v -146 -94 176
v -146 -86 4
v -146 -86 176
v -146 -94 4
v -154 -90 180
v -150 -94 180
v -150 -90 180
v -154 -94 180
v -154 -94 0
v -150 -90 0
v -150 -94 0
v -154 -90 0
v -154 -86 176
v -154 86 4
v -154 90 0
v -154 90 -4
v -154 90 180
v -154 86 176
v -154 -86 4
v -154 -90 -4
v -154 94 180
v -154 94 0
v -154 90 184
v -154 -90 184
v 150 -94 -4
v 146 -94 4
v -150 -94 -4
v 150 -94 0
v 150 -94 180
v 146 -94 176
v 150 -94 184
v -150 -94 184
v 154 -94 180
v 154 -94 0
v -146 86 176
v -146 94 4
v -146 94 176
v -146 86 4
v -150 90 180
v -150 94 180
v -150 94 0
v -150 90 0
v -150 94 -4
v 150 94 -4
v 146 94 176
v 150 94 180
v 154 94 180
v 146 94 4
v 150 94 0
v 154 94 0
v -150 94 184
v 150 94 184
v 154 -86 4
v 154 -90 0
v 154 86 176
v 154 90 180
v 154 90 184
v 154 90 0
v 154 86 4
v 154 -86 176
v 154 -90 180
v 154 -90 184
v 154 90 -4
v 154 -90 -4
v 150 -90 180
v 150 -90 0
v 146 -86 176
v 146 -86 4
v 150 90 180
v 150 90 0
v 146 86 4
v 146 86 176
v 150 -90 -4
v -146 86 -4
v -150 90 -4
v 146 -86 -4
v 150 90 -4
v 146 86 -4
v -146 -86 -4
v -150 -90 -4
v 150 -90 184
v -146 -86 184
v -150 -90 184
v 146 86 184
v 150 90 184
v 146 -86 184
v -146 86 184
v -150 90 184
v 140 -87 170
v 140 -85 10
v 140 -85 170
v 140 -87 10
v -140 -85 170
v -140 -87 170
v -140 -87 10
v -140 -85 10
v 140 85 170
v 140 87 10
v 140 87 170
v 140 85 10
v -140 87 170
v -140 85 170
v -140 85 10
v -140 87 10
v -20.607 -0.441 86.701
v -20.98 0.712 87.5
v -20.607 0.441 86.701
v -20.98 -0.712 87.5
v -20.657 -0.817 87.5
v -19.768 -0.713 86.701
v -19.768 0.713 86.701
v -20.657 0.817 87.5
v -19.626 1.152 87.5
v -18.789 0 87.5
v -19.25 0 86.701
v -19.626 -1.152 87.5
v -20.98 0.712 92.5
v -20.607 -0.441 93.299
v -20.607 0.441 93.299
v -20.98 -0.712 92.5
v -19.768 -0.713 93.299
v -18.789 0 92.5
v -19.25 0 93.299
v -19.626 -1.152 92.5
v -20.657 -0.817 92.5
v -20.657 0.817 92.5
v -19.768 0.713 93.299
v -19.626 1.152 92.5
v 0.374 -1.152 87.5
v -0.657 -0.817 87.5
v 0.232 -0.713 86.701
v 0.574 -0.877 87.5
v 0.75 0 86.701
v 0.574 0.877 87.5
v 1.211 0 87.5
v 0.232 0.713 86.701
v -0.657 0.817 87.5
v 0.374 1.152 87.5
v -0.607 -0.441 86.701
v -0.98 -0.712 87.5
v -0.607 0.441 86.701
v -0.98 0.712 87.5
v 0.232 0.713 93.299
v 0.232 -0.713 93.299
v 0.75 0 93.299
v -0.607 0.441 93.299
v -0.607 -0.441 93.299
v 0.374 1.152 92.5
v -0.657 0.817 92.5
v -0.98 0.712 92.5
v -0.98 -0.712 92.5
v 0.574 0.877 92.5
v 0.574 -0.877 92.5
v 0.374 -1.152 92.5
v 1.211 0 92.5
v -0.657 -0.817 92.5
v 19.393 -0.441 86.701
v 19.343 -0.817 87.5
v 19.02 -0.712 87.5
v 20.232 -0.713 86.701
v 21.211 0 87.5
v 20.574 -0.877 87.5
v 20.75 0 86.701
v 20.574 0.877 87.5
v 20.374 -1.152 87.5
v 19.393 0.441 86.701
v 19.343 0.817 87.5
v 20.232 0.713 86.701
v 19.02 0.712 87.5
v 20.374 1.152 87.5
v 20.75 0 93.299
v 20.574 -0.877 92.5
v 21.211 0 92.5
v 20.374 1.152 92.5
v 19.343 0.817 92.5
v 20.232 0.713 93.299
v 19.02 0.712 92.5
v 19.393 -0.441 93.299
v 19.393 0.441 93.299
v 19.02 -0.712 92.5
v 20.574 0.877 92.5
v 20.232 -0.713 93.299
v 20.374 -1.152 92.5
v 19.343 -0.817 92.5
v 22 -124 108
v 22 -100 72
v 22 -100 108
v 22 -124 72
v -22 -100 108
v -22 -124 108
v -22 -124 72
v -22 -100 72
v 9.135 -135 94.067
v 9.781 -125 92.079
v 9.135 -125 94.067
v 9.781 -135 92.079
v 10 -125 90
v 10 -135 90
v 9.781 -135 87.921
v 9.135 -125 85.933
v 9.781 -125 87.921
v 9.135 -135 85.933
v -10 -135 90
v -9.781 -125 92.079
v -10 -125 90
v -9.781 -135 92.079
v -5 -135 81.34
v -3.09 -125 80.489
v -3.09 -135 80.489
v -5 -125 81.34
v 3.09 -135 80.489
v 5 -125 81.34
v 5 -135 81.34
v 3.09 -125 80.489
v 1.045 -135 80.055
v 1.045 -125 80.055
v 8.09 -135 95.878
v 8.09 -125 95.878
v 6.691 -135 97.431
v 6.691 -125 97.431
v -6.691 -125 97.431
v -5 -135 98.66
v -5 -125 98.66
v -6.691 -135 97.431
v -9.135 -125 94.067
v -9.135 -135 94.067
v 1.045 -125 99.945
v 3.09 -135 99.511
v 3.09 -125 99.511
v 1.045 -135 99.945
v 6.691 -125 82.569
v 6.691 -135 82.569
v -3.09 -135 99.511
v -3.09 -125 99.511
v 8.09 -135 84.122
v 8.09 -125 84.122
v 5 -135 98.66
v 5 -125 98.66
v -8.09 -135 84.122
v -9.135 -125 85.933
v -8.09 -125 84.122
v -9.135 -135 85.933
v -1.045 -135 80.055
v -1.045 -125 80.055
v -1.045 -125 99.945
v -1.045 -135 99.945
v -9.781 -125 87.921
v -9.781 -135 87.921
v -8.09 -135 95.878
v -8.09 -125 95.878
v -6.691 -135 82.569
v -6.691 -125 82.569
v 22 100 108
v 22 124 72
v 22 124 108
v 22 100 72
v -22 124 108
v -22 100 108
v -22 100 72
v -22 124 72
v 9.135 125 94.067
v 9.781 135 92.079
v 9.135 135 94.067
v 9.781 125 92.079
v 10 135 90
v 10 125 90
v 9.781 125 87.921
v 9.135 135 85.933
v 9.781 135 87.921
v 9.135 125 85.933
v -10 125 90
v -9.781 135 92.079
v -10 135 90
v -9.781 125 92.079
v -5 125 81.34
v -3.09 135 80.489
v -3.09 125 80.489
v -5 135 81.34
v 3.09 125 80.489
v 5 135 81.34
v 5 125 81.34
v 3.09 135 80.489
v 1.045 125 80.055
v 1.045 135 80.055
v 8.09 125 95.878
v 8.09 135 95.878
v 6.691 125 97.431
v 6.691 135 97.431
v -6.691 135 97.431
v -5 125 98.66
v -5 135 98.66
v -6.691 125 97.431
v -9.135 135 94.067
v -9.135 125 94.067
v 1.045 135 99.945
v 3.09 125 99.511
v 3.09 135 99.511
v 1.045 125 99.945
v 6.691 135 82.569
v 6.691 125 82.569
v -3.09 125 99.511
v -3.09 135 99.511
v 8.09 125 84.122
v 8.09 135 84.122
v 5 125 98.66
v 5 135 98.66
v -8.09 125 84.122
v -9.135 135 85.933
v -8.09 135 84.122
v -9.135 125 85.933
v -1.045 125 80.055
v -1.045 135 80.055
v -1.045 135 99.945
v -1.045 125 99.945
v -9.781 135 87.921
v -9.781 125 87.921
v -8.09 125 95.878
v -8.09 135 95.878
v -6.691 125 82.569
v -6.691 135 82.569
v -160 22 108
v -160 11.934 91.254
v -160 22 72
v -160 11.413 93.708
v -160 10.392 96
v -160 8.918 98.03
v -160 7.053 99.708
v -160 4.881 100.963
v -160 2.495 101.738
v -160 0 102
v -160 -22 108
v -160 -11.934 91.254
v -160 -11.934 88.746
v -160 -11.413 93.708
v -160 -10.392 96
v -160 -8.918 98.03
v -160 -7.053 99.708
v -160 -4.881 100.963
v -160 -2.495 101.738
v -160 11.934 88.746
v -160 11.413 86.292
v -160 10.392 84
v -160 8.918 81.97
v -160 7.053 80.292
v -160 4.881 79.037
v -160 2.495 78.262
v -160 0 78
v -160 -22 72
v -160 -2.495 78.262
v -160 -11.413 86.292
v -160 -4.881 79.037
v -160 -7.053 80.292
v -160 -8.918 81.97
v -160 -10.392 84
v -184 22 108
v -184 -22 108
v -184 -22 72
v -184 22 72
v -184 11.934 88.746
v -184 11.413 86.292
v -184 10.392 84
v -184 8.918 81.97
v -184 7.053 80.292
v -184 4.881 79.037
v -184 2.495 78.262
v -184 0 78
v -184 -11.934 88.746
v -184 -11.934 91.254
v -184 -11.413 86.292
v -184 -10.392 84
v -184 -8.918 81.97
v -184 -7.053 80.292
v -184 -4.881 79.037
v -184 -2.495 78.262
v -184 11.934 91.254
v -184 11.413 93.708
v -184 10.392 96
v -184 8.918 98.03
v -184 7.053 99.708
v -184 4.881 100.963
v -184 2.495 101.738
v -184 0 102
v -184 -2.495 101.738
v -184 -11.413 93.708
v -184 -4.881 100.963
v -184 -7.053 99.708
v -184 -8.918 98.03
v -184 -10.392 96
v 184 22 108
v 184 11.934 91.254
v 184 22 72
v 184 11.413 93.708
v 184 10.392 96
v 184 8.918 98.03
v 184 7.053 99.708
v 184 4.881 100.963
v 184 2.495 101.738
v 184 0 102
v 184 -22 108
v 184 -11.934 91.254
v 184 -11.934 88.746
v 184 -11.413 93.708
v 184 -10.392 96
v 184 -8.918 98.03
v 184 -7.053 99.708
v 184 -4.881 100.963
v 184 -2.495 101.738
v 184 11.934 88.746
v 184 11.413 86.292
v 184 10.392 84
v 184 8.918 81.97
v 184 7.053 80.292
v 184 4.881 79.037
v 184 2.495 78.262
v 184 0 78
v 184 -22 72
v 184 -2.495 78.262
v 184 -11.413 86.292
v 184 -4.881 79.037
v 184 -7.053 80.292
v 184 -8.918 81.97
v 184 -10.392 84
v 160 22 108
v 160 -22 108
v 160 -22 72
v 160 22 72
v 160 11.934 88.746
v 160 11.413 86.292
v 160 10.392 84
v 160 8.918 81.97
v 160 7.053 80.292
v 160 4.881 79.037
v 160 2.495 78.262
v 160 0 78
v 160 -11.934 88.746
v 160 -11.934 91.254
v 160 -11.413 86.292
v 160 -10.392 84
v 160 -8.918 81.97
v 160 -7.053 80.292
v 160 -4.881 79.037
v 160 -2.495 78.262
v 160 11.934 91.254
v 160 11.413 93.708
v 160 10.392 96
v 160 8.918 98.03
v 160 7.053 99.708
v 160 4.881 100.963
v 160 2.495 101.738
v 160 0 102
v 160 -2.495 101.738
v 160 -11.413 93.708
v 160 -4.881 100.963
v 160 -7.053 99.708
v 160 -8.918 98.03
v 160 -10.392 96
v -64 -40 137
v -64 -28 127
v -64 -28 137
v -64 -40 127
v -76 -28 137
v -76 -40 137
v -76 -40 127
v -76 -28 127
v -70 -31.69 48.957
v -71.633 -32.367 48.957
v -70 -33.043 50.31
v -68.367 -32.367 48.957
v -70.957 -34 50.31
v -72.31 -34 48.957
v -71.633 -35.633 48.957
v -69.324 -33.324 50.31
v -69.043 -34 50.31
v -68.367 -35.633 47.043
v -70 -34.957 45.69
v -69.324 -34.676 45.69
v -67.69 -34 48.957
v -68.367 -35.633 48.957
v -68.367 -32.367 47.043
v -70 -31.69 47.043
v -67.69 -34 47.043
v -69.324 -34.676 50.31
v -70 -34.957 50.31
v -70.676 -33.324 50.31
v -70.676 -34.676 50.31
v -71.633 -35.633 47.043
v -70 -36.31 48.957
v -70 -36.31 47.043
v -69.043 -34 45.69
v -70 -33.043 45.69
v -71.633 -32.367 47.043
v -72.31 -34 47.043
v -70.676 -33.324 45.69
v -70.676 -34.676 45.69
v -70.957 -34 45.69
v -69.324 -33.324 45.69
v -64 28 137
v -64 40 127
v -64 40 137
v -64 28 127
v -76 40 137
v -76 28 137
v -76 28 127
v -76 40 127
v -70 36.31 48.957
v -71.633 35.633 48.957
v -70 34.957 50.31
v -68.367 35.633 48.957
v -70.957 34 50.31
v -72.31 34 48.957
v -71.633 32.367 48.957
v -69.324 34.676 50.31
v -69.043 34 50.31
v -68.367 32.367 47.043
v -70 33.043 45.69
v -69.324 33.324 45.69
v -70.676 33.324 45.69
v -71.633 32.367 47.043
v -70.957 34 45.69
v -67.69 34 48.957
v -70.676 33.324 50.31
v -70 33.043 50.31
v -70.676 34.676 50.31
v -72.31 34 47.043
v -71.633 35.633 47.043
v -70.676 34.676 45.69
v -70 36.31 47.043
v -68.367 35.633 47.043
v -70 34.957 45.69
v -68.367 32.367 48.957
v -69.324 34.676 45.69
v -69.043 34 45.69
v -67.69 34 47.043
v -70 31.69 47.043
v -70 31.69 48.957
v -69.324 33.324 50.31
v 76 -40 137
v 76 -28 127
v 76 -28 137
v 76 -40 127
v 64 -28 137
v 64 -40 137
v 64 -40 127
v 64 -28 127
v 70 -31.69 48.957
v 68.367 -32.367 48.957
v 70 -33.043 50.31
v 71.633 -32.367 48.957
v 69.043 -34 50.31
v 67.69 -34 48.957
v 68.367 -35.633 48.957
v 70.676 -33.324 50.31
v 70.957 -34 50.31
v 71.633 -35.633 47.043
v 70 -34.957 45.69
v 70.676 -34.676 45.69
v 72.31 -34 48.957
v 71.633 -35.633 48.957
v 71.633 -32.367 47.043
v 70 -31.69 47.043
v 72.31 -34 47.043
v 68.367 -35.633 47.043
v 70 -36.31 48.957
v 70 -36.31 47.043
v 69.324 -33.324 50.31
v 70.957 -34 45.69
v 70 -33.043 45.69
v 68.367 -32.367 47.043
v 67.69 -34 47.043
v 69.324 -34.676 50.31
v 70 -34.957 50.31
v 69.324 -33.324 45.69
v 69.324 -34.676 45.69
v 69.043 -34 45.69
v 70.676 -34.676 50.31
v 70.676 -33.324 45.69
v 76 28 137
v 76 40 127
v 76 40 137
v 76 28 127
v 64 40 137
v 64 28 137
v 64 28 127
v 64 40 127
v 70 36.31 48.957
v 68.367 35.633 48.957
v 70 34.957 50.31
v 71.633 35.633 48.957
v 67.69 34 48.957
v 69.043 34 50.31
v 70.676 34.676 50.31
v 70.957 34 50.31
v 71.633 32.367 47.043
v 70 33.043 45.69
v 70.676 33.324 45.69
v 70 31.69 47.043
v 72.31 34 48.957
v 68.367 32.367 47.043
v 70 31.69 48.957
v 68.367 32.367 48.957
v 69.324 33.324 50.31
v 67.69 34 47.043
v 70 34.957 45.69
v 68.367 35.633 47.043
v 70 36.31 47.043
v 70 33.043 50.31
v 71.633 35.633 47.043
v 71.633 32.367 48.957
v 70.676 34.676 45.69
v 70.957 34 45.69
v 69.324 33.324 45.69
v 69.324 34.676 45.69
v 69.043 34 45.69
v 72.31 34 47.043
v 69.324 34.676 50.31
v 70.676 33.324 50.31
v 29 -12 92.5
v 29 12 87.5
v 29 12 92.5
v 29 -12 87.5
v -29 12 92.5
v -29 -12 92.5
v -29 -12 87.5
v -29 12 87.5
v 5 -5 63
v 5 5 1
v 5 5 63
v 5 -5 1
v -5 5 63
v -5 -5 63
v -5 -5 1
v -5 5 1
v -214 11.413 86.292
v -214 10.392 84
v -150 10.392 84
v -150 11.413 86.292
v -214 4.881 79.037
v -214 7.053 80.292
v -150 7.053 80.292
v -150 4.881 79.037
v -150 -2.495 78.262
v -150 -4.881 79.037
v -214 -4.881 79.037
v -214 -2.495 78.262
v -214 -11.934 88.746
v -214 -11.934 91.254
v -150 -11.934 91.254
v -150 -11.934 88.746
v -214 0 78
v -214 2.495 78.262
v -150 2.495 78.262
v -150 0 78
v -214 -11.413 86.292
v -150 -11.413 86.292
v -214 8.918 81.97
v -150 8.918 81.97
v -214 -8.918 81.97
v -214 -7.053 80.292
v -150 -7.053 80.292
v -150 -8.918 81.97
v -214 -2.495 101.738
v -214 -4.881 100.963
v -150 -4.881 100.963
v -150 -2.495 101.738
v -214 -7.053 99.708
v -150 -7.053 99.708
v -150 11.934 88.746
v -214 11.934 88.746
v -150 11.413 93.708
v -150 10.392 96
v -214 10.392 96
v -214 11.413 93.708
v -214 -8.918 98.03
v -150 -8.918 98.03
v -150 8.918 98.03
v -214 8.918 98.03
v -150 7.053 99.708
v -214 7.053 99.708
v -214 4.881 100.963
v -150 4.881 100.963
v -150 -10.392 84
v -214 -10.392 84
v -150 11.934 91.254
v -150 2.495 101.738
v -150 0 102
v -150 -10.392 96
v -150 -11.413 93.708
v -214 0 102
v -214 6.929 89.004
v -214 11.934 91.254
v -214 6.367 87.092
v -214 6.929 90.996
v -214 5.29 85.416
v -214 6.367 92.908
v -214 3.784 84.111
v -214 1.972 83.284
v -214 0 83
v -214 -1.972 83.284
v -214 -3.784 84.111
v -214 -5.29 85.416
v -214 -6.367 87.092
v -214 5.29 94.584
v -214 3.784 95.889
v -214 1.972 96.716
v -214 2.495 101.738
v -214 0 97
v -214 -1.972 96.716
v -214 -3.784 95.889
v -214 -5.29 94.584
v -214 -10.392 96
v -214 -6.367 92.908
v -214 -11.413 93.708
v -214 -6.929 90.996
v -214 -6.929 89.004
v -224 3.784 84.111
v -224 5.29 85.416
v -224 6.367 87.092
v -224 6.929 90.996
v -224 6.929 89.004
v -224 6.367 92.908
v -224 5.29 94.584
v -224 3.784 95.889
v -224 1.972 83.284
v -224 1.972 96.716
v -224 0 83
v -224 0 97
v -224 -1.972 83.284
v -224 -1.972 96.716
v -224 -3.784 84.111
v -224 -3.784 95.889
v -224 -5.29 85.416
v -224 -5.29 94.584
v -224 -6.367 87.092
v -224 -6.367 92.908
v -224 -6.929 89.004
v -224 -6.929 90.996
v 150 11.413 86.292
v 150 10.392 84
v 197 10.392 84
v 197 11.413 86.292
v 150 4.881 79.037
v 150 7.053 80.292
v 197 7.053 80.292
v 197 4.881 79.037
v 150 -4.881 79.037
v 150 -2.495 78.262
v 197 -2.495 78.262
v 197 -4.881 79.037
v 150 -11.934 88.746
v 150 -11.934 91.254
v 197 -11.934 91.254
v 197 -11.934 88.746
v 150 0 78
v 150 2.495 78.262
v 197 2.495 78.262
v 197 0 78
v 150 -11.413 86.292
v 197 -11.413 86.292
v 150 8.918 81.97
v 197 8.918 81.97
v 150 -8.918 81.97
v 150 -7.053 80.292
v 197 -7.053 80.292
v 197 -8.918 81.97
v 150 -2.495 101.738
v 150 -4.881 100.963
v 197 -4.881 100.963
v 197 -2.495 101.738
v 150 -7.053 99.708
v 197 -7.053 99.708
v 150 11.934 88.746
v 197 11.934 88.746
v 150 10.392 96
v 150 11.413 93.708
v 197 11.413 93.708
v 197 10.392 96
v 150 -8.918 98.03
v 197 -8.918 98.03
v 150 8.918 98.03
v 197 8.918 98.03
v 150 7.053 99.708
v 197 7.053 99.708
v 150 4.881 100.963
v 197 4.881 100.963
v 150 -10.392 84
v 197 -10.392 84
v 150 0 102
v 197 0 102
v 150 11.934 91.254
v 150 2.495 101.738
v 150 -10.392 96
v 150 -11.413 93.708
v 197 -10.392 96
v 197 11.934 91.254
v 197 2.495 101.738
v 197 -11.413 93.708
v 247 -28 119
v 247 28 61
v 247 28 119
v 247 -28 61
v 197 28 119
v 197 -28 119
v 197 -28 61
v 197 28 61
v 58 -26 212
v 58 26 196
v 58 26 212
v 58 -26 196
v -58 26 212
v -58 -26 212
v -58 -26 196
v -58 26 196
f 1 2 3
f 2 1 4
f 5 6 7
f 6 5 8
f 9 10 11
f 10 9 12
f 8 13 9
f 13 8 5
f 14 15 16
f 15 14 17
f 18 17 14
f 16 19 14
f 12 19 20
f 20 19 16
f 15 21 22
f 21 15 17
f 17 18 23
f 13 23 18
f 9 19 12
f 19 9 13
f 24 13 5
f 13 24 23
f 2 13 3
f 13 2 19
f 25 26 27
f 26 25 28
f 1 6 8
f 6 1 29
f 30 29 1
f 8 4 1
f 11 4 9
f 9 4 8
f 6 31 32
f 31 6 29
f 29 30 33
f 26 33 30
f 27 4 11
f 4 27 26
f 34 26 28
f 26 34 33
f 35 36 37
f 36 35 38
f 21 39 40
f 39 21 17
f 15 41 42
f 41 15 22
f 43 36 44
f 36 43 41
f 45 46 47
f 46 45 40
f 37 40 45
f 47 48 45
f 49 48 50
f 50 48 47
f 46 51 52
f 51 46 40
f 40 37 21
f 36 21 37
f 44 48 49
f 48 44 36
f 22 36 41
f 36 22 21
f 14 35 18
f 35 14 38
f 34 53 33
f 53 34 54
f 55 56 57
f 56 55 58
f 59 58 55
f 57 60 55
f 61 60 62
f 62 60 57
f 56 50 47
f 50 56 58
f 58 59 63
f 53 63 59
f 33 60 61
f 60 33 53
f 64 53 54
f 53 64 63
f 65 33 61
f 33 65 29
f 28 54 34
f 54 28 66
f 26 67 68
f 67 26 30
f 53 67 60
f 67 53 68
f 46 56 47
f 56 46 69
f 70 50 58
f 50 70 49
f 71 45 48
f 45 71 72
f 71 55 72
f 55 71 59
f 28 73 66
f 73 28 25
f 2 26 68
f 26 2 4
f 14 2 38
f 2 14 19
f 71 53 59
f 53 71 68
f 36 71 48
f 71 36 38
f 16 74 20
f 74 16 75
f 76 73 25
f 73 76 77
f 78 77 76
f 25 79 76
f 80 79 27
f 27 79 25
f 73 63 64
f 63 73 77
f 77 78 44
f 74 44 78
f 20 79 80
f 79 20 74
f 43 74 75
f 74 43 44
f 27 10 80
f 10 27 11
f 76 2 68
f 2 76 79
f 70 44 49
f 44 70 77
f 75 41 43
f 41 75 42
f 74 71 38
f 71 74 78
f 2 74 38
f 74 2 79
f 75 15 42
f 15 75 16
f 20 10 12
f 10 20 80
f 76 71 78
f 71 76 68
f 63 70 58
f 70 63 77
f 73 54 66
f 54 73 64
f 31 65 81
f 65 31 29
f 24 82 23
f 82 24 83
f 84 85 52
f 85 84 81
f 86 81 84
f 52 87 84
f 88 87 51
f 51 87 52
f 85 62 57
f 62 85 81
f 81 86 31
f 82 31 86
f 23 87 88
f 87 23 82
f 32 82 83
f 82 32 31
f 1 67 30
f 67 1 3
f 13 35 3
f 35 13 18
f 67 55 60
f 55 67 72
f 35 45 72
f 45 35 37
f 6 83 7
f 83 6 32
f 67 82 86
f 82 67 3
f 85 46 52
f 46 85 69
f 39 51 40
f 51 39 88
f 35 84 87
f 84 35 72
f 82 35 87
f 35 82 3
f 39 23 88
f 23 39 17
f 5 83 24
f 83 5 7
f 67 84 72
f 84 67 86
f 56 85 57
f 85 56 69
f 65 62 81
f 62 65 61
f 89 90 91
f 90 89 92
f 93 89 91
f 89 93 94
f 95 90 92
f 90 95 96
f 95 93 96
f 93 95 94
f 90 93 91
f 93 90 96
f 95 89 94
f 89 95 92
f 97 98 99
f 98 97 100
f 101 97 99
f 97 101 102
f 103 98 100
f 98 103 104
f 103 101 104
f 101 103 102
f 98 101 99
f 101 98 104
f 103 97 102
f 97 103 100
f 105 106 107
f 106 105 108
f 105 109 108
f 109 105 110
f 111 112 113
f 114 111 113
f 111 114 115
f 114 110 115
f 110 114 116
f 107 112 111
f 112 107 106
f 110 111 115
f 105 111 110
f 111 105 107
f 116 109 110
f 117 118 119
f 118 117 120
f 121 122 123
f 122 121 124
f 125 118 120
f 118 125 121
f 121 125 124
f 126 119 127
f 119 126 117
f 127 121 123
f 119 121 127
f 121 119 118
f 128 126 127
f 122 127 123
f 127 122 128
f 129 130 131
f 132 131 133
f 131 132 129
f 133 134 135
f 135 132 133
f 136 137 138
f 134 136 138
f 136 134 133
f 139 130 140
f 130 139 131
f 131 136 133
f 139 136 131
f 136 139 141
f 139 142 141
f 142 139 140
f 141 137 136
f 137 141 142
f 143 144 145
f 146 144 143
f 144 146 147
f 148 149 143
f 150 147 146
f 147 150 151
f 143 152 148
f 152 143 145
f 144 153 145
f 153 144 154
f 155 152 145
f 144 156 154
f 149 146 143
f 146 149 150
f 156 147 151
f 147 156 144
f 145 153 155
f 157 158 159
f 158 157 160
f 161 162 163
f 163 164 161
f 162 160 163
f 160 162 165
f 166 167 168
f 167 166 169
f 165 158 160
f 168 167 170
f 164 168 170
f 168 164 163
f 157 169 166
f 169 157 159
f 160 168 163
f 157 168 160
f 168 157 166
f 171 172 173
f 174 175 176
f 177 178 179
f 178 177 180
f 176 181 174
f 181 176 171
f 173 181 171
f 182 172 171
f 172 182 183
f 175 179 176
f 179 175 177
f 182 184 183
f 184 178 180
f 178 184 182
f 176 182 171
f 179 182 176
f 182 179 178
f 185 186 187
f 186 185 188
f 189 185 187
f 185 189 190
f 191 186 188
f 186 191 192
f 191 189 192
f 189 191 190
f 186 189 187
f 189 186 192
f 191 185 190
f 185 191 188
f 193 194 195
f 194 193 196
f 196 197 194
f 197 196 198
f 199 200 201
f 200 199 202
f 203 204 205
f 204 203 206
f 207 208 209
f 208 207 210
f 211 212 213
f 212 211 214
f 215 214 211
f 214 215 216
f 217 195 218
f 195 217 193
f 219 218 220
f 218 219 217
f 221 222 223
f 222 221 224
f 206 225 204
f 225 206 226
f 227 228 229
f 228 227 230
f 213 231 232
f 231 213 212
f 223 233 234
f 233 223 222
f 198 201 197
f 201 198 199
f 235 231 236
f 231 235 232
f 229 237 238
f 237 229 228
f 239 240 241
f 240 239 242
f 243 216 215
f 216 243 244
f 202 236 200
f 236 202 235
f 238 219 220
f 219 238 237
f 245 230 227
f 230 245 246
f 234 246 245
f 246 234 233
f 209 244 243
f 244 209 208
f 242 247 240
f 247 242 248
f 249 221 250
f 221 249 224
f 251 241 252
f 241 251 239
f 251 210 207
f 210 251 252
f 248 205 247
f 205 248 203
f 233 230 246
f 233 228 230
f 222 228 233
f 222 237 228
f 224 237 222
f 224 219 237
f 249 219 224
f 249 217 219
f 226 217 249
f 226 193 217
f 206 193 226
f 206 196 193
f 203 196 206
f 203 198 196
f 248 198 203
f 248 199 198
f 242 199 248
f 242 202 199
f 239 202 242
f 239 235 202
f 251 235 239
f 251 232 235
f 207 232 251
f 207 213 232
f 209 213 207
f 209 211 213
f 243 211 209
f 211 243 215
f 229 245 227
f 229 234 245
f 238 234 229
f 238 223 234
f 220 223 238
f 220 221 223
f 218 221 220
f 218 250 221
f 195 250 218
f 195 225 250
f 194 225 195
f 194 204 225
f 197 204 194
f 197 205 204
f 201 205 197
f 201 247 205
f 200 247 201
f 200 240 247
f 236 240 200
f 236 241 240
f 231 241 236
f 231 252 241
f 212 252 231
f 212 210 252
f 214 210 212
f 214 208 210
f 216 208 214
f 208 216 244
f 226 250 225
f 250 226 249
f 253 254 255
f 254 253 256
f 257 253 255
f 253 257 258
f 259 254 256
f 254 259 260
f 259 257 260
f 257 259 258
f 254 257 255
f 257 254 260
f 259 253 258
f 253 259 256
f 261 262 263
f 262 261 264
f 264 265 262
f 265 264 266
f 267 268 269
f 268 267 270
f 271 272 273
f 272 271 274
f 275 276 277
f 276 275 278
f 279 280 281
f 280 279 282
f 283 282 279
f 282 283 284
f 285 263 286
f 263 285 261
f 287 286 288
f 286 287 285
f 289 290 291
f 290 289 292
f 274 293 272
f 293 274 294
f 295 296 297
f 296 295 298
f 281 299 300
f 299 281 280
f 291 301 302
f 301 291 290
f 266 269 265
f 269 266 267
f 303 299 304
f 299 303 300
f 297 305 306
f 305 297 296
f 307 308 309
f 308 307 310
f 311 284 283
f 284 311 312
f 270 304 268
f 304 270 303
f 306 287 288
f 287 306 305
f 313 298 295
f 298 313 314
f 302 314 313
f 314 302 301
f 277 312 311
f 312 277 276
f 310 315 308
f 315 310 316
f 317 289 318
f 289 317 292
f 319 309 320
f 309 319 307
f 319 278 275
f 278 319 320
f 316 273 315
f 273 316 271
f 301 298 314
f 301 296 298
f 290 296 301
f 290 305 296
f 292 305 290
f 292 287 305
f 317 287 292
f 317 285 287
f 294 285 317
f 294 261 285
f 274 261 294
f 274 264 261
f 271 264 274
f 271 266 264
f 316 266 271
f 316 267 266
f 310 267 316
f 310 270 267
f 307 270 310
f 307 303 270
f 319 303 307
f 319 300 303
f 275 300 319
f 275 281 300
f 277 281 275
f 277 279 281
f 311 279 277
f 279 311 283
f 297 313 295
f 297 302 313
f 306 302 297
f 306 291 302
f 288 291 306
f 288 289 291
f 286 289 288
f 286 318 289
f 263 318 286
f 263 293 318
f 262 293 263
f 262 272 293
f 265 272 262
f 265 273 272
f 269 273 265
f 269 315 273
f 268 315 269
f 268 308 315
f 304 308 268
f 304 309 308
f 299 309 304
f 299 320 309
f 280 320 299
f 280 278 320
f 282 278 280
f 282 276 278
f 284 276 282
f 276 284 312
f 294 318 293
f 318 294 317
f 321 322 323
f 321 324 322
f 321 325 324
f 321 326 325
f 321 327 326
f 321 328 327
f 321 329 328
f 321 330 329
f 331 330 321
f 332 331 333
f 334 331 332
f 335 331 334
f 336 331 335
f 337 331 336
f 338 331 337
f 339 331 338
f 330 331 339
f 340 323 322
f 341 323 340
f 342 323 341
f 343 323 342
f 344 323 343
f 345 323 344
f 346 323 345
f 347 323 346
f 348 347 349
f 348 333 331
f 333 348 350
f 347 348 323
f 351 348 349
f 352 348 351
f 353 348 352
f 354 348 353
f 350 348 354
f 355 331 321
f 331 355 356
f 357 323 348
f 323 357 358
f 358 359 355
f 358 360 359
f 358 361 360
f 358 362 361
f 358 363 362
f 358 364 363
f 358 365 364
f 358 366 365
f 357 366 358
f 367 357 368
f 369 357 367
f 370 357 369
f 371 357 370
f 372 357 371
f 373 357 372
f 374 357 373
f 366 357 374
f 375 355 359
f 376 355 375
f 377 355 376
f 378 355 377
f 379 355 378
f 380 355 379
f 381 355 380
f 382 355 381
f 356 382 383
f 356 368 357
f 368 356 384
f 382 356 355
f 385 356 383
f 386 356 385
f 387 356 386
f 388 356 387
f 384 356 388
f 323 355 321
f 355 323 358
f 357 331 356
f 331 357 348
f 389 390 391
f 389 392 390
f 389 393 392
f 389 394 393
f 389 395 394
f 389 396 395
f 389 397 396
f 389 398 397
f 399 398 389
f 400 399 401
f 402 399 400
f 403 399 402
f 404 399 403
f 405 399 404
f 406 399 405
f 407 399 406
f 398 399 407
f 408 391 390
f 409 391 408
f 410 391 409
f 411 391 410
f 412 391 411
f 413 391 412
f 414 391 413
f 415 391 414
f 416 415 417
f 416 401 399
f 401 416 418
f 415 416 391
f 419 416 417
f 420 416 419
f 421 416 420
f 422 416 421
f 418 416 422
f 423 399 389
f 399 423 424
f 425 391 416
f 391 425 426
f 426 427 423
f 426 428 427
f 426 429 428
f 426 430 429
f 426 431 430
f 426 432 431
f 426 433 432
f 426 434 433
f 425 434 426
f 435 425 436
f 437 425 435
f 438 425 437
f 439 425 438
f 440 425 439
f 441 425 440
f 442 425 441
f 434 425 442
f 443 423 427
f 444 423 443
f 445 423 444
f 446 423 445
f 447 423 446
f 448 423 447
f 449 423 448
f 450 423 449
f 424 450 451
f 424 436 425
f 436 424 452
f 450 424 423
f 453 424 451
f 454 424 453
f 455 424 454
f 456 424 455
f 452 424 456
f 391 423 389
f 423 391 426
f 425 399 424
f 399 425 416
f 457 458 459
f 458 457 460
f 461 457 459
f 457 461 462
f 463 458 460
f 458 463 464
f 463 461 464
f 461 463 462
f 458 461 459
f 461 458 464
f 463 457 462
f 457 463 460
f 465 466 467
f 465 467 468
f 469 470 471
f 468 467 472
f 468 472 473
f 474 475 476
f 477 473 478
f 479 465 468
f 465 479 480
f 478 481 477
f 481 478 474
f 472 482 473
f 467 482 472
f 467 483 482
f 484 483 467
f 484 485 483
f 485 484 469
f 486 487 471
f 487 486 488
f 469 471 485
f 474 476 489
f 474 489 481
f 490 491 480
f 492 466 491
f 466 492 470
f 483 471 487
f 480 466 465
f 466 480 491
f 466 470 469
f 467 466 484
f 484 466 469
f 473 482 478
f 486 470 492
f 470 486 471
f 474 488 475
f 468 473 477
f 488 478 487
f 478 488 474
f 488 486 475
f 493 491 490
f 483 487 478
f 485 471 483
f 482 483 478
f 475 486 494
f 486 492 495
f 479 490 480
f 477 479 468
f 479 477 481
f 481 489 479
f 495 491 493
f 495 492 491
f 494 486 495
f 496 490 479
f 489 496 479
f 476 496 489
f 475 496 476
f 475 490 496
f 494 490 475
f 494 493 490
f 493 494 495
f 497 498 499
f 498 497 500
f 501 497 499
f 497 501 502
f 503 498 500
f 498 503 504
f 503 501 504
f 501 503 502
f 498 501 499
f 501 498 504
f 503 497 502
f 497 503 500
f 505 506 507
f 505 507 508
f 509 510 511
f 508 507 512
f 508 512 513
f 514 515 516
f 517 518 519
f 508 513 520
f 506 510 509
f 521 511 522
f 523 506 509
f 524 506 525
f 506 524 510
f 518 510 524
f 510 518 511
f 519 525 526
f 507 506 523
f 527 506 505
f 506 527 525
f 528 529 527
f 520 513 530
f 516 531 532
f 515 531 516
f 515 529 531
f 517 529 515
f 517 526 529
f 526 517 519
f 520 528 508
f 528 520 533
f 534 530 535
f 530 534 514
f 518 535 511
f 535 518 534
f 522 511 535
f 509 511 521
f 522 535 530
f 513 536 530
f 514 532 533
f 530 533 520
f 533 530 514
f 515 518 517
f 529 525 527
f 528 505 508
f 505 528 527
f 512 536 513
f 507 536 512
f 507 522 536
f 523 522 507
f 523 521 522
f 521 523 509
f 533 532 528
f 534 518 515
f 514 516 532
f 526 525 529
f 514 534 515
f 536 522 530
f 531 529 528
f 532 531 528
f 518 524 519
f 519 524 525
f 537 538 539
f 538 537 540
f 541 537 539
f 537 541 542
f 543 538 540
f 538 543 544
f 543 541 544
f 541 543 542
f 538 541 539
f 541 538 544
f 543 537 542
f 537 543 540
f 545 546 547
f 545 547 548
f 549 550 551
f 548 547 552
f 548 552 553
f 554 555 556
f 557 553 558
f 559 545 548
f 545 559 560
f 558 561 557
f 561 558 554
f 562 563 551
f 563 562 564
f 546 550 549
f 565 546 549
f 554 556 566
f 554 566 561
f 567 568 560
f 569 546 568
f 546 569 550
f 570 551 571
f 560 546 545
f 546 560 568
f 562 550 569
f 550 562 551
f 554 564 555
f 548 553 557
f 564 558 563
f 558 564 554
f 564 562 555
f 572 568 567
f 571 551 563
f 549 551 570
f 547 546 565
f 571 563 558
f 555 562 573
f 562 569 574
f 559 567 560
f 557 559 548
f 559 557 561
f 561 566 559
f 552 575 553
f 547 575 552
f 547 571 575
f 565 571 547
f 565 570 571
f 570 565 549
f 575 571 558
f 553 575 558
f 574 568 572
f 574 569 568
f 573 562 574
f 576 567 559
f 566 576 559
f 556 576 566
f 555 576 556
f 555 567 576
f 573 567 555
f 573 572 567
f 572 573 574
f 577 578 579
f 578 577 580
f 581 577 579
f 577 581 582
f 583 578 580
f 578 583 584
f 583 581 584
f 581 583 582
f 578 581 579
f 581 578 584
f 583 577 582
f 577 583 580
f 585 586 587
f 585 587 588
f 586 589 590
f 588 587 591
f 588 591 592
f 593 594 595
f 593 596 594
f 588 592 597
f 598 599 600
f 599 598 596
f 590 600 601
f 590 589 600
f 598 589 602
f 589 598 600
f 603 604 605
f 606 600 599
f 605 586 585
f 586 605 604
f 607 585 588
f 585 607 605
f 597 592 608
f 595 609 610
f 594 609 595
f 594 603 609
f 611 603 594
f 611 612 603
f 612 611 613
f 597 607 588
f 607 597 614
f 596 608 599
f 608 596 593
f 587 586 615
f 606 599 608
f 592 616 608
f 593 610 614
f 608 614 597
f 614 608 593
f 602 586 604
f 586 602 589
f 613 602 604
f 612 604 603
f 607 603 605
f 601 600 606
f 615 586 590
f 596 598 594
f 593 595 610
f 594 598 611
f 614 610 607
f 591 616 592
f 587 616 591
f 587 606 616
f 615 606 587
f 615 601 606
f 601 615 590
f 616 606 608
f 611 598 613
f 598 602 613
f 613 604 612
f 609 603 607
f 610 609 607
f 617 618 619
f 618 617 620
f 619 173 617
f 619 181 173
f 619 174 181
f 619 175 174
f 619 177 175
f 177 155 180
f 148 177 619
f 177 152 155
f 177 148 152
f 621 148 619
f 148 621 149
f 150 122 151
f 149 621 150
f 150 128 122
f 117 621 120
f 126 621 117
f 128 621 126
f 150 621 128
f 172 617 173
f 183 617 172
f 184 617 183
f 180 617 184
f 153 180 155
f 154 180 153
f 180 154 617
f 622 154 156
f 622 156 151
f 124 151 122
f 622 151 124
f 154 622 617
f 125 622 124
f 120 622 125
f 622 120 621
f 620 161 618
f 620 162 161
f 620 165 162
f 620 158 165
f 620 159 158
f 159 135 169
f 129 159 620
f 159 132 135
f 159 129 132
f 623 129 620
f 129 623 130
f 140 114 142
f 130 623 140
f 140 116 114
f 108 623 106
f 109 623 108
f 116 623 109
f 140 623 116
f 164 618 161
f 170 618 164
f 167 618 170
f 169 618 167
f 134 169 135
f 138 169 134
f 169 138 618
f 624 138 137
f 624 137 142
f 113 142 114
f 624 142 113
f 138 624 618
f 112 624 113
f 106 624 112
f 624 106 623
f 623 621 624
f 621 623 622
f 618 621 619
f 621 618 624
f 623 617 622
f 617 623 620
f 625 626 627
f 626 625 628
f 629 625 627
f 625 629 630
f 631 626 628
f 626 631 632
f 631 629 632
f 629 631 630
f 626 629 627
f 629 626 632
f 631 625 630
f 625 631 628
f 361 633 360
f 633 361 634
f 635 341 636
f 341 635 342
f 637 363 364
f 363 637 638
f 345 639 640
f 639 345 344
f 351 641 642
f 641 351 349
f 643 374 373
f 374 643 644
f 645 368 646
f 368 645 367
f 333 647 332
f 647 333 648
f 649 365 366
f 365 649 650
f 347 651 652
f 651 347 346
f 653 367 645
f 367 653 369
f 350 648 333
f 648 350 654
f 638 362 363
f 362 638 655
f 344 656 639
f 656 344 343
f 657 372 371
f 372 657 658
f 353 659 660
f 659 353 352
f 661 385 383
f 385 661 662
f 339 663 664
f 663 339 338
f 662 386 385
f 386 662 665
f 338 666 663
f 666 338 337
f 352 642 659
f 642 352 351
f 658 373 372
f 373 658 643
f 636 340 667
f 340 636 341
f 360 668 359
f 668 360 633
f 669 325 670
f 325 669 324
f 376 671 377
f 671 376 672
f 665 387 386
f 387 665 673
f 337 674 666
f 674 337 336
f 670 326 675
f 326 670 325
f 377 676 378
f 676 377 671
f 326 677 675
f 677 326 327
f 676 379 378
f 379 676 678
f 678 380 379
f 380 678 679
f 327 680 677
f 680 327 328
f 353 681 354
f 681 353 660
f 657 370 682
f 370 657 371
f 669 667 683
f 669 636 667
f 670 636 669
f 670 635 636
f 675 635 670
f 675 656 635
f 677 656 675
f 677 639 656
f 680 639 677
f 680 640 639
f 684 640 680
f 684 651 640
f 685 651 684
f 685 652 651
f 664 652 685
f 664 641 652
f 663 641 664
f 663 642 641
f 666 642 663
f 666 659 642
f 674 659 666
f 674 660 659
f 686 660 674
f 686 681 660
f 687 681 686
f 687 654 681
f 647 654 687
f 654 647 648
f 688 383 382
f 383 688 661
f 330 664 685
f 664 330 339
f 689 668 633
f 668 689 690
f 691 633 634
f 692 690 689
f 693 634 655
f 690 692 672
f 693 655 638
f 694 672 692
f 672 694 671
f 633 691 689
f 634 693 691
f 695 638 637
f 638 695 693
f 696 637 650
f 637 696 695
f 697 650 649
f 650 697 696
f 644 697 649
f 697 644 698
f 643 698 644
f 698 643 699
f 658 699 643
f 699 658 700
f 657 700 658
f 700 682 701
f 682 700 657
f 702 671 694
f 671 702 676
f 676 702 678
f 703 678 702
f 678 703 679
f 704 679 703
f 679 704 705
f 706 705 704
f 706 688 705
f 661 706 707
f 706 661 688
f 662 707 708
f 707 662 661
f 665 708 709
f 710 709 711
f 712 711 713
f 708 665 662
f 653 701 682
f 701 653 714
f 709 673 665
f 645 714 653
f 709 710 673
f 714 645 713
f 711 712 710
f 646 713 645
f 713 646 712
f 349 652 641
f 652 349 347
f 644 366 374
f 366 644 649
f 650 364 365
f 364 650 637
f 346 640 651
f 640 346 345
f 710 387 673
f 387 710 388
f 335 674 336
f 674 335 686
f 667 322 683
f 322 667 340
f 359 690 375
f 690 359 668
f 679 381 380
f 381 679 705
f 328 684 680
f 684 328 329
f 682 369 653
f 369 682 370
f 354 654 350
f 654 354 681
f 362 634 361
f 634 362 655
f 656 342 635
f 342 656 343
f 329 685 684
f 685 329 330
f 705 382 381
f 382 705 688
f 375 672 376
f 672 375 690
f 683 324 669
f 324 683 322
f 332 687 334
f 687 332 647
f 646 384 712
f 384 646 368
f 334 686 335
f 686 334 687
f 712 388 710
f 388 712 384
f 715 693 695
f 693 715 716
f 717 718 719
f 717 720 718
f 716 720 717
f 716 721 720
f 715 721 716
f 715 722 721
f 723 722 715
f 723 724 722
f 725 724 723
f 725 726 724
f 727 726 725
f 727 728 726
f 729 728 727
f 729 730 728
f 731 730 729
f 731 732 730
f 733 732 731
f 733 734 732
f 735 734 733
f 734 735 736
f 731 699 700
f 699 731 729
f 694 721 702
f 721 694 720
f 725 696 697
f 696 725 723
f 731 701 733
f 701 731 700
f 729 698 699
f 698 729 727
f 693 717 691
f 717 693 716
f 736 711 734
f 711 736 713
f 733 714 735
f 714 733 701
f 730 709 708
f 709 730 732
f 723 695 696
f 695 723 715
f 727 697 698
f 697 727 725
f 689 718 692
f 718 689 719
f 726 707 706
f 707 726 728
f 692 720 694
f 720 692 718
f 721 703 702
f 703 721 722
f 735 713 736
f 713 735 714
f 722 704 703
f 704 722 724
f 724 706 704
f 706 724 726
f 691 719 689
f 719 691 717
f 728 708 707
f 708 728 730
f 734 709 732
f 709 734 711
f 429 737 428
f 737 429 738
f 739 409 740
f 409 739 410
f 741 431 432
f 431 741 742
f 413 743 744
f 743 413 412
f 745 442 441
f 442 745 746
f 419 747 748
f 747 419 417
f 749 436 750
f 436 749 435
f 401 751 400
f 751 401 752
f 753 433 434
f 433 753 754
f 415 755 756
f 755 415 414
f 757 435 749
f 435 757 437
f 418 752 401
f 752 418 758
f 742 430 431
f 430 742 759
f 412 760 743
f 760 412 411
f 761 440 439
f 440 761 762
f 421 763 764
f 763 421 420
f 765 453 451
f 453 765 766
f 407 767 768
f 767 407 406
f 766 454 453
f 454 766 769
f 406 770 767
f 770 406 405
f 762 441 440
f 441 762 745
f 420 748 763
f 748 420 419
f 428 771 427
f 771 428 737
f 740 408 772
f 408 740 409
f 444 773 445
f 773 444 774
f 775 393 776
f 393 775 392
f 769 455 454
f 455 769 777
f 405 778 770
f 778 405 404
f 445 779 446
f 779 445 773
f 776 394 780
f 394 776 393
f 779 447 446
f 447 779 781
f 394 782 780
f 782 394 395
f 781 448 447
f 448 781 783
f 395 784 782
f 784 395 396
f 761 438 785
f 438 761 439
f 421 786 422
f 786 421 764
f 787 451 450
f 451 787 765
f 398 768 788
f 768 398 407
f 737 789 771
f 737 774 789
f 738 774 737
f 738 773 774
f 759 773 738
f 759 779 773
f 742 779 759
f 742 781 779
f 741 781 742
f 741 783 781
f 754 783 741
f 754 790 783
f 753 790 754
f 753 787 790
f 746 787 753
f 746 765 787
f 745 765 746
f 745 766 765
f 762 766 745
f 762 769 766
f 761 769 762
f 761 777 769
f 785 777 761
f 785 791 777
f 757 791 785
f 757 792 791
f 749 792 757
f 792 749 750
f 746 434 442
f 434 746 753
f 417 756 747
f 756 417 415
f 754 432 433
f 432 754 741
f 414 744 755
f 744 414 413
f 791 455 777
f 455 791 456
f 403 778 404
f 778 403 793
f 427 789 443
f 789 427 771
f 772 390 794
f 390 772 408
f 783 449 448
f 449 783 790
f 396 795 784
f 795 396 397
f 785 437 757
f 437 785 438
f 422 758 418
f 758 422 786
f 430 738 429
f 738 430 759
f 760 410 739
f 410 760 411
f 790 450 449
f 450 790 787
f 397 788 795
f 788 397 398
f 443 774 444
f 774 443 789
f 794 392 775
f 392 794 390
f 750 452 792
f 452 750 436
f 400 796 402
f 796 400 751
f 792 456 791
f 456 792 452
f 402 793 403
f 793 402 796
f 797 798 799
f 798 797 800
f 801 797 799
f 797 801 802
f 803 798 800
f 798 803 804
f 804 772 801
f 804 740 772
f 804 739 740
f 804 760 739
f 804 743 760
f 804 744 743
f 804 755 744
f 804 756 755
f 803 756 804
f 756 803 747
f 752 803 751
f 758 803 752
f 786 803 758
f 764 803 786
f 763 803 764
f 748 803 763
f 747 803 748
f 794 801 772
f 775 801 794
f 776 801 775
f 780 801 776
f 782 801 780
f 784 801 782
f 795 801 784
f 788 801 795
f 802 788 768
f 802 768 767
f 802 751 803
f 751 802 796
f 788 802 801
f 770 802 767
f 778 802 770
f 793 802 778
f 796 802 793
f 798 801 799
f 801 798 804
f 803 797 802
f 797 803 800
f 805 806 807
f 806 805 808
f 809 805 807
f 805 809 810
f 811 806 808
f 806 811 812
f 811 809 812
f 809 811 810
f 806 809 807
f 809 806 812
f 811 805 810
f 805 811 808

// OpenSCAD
// EXTINCTION-PATHWAY-MAP concept cell. Dimensions are illustrative mm only.
L=300; W=180; H=180; Z=H/2;
// Corner posts and top/bottom optical rails; windows are schematic.
for(x=[-L/2,L/2]) for(y=[-W/2,W/2]) color([.55,.68,.74]) translate([x,y,Z]) cube([8,8,H],center=true);
for(z=[0,H]){
 for(y=[-W/2,W/2]) color([.55,.68,.74]) translate([0,y,z]) cube([L,8,8],center=true);
 for(x=[-L/2,L/2]) color([.55,.68,.74]) translate([x,0,z]) cube([8,W,8],center=true);
}
for(y=[-W/2+4,W/2-4]) color([.12,.7,.82,.12]) translate([0,y,Z]) cube([L-20,2,H-20],center=true);
// Symbolic PMMA coupon, holder and paired surface/depth temperature witnesses.
color([.92,.79,.58]) translate([0,0,Z]) cube([58,24,5],center=true);
color([.55,.68,.74]) translate([0,0,32]) cube([10,10,62],center=true);
for(x=[-20,0,20]) for(z=[Z-2,Z+2]) color([1,.55,.14]) translate([x,0,z]) sphere(d=3);
// Orthogonal camera envelopes with optical axes crossing the sample.
for(y=[-W/2-22,W/2+22]){
 color([.55,.68,.74]) translate([0,y,Z]) cube([44,24,36],center=true);
 color([.08,.15,.2]) translate([0,y+sign(y)*18,Z]) rotate([90,0,0]) cylinder(d=20,h=10,center=true);
}
for(x=[-L/2-22,L/2+22]){
 color([.55,.68,.74]) translate([x,0,Z]) cube([24,44,36],center=true);
 color([.08,.15,.2]) translate([x+sign(x)*18,0,Z]) rotate([0,90,0]) cylinder(d=20,h=10,center=true);
}
// Independent gas inlet/exhaust trunks; no agent, pressure or flow chosen.
color([.55,.68,.74]) translate([-L/2-32,0,Z]) rotate([0,90,0]) cylinder(d=24,h=64,center=true);
color([.15,.72,.82]) translate([-L/2-68,0,Z]) rotate([0,90,0]) cylinder(d=14,h=12,center=true);
color([.55,.68,.74]) translate([L/2+32,0,Z]) rotate([0,90,0]) cylinder(d=24,h=64,center=true);
color([.08,.15,.2]) translate([L/2+72,0,Z]) cube([50,56,58],center=true);
// Schematic O2 / flow point probes on the near and far sides.
for(x=[-70,70]) for(y=[-34,34]){
 color([.15,.72,.82]) translate([x,y,Z+42]) cube([12,12,10],center=true);
 color([1,.55,.14]) translate([x,y,Z-42]) sphere(d=5);
}
color([.15,.72,.82]) translate([0,0,H+24]) cube([116,52,16],center=true);
